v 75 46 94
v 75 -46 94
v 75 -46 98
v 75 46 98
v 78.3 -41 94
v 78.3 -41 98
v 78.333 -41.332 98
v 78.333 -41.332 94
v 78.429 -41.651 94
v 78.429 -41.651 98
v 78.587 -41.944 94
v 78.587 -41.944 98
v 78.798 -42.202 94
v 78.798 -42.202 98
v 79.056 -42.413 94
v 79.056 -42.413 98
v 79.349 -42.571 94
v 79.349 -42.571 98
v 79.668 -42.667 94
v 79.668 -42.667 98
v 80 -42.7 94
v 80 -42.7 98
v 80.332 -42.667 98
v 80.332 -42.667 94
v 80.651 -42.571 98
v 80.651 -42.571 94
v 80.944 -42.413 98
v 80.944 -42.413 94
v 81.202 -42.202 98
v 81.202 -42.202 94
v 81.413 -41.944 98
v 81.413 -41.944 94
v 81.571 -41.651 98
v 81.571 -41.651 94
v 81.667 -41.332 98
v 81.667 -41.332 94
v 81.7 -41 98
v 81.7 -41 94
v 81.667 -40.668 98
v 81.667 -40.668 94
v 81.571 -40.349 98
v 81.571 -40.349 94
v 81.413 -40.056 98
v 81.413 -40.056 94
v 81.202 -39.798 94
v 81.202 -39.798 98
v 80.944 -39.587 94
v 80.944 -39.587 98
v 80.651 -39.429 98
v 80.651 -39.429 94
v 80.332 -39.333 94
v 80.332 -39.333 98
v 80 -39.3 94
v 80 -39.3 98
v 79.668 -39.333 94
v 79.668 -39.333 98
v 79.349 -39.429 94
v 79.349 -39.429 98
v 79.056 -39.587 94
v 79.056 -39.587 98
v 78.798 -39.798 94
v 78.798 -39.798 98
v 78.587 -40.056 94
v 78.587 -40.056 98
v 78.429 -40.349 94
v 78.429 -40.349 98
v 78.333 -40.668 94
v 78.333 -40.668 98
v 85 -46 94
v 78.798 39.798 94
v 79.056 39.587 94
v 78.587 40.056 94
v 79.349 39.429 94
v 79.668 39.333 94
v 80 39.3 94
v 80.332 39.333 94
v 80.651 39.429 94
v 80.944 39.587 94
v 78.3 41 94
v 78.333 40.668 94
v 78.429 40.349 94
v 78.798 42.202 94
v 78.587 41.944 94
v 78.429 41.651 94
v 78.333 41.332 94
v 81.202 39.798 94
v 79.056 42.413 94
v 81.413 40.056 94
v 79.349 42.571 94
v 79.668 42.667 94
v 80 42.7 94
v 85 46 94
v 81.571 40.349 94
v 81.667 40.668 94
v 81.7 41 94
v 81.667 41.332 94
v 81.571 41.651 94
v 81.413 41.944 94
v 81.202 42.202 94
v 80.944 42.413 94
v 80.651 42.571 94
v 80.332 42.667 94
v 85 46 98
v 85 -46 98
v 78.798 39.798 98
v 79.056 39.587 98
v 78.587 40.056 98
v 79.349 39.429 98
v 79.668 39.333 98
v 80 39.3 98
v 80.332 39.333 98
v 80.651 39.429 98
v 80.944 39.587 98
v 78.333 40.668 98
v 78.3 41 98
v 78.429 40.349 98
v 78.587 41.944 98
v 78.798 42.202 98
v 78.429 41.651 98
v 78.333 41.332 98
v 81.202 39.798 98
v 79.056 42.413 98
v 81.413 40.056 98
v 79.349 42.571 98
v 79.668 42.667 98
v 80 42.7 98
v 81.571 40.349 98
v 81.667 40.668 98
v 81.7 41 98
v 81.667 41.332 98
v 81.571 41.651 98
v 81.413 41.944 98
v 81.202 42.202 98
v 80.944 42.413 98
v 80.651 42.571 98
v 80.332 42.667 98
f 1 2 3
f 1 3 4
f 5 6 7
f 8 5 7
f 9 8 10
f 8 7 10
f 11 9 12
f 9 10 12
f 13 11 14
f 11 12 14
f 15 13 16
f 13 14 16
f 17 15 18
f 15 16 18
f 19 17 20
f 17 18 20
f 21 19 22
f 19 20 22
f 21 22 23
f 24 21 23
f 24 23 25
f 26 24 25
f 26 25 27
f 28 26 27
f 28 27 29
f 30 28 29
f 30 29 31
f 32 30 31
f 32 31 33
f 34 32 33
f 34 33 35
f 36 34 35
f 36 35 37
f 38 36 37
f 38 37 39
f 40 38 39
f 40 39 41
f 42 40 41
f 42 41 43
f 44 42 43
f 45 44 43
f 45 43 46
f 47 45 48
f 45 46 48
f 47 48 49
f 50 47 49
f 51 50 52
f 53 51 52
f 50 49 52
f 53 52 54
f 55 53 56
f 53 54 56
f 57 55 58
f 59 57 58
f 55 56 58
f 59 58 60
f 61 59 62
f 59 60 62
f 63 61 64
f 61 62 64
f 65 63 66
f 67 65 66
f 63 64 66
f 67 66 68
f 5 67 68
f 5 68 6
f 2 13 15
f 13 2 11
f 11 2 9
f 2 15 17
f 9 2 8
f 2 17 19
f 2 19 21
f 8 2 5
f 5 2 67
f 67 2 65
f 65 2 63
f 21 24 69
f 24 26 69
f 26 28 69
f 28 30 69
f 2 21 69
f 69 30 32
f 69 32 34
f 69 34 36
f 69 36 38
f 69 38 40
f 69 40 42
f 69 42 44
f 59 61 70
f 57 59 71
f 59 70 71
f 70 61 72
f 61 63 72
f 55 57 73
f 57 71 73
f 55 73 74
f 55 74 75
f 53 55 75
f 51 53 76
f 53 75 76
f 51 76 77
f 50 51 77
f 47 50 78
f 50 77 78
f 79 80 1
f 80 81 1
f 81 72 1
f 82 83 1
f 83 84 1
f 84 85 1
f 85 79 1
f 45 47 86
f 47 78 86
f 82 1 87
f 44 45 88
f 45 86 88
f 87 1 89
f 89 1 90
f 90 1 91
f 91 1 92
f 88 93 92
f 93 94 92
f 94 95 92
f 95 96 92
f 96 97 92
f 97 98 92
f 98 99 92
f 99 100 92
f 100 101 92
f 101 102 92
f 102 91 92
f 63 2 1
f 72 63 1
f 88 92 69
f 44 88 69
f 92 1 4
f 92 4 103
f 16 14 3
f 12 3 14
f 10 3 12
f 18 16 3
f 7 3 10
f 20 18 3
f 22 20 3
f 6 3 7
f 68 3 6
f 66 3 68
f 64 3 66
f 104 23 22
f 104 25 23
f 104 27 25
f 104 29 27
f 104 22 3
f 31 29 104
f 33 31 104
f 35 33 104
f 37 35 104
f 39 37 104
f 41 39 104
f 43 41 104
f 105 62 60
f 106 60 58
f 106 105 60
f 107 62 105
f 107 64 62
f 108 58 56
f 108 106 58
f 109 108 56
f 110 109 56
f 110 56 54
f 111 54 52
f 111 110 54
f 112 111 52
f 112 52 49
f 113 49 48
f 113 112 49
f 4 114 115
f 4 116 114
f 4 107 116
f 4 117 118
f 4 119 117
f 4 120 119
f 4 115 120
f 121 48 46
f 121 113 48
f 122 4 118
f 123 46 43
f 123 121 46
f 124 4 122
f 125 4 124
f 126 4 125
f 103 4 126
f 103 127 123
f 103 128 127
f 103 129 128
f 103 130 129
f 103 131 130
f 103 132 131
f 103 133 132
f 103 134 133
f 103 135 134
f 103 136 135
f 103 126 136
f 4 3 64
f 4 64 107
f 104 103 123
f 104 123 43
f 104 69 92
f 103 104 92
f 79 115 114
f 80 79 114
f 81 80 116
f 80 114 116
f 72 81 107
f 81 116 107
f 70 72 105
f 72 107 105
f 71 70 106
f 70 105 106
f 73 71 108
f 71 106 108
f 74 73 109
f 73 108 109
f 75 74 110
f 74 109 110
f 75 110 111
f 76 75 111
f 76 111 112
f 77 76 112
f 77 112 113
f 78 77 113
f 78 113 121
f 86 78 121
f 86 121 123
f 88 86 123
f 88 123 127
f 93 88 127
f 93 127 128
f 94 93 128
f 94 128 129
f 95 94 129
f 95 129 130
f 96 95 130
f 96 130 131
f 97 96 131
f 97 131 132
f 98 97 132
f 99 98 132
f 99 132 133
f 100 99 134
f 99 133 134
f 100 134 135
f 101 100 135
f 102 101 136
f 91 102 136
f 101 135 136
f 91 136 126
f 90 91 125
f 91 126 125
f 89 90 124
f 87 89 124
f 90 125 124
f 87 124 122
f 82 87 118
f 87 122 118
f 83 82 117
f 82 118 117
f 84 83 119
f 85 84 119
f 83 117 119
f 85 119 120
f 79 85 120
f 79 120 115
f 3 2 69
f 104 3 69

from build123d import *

# Parameters (mm, degrees)
CONTROL_BATTERY_CLAMP_START = 94
SKETCH_1_W                  = 10
SKETCH_1_H                  = 92
CONTROL_BATTERY_CLAMP_DEPTH = 4
CLAMP_TWO_M3_START          = 99
SKETCH_2_R                  = 1.7
CLAMP_TWO_M3_DEPTH          = 6


with BuildPart() as part:
    # 草图1 → Control_battery_clamp (new body)
    with BuildSketch(Plane.XY.offset(CONTROL_BATTERY_CLAMP_START)):
        with Locations((80, 0)):
            Rectangle(SKETCH_1_W, SKETCH_1_H)
    extrude(amount=CONTROL_BATTERY_CLAMP_DEPTH)

    # 草图2 → Clamp_two_M3 (cut)
    with BuildSketch(Plane.XY.offset(CLAMP_TWO_M3_START)):
        with Locations(Location((80, -41, 0), (0, 0, 180))):
            Circle(SKETCH_2_R)
        with Locations(Location((80, 41, 0), (0, 0, 180))):
            Circle(SKETCH_2_R)
    extrude(amount=-CLAMP_TWO_M3_DEPTH, mode=Mode.SUBTRACT)


solid = part.part
